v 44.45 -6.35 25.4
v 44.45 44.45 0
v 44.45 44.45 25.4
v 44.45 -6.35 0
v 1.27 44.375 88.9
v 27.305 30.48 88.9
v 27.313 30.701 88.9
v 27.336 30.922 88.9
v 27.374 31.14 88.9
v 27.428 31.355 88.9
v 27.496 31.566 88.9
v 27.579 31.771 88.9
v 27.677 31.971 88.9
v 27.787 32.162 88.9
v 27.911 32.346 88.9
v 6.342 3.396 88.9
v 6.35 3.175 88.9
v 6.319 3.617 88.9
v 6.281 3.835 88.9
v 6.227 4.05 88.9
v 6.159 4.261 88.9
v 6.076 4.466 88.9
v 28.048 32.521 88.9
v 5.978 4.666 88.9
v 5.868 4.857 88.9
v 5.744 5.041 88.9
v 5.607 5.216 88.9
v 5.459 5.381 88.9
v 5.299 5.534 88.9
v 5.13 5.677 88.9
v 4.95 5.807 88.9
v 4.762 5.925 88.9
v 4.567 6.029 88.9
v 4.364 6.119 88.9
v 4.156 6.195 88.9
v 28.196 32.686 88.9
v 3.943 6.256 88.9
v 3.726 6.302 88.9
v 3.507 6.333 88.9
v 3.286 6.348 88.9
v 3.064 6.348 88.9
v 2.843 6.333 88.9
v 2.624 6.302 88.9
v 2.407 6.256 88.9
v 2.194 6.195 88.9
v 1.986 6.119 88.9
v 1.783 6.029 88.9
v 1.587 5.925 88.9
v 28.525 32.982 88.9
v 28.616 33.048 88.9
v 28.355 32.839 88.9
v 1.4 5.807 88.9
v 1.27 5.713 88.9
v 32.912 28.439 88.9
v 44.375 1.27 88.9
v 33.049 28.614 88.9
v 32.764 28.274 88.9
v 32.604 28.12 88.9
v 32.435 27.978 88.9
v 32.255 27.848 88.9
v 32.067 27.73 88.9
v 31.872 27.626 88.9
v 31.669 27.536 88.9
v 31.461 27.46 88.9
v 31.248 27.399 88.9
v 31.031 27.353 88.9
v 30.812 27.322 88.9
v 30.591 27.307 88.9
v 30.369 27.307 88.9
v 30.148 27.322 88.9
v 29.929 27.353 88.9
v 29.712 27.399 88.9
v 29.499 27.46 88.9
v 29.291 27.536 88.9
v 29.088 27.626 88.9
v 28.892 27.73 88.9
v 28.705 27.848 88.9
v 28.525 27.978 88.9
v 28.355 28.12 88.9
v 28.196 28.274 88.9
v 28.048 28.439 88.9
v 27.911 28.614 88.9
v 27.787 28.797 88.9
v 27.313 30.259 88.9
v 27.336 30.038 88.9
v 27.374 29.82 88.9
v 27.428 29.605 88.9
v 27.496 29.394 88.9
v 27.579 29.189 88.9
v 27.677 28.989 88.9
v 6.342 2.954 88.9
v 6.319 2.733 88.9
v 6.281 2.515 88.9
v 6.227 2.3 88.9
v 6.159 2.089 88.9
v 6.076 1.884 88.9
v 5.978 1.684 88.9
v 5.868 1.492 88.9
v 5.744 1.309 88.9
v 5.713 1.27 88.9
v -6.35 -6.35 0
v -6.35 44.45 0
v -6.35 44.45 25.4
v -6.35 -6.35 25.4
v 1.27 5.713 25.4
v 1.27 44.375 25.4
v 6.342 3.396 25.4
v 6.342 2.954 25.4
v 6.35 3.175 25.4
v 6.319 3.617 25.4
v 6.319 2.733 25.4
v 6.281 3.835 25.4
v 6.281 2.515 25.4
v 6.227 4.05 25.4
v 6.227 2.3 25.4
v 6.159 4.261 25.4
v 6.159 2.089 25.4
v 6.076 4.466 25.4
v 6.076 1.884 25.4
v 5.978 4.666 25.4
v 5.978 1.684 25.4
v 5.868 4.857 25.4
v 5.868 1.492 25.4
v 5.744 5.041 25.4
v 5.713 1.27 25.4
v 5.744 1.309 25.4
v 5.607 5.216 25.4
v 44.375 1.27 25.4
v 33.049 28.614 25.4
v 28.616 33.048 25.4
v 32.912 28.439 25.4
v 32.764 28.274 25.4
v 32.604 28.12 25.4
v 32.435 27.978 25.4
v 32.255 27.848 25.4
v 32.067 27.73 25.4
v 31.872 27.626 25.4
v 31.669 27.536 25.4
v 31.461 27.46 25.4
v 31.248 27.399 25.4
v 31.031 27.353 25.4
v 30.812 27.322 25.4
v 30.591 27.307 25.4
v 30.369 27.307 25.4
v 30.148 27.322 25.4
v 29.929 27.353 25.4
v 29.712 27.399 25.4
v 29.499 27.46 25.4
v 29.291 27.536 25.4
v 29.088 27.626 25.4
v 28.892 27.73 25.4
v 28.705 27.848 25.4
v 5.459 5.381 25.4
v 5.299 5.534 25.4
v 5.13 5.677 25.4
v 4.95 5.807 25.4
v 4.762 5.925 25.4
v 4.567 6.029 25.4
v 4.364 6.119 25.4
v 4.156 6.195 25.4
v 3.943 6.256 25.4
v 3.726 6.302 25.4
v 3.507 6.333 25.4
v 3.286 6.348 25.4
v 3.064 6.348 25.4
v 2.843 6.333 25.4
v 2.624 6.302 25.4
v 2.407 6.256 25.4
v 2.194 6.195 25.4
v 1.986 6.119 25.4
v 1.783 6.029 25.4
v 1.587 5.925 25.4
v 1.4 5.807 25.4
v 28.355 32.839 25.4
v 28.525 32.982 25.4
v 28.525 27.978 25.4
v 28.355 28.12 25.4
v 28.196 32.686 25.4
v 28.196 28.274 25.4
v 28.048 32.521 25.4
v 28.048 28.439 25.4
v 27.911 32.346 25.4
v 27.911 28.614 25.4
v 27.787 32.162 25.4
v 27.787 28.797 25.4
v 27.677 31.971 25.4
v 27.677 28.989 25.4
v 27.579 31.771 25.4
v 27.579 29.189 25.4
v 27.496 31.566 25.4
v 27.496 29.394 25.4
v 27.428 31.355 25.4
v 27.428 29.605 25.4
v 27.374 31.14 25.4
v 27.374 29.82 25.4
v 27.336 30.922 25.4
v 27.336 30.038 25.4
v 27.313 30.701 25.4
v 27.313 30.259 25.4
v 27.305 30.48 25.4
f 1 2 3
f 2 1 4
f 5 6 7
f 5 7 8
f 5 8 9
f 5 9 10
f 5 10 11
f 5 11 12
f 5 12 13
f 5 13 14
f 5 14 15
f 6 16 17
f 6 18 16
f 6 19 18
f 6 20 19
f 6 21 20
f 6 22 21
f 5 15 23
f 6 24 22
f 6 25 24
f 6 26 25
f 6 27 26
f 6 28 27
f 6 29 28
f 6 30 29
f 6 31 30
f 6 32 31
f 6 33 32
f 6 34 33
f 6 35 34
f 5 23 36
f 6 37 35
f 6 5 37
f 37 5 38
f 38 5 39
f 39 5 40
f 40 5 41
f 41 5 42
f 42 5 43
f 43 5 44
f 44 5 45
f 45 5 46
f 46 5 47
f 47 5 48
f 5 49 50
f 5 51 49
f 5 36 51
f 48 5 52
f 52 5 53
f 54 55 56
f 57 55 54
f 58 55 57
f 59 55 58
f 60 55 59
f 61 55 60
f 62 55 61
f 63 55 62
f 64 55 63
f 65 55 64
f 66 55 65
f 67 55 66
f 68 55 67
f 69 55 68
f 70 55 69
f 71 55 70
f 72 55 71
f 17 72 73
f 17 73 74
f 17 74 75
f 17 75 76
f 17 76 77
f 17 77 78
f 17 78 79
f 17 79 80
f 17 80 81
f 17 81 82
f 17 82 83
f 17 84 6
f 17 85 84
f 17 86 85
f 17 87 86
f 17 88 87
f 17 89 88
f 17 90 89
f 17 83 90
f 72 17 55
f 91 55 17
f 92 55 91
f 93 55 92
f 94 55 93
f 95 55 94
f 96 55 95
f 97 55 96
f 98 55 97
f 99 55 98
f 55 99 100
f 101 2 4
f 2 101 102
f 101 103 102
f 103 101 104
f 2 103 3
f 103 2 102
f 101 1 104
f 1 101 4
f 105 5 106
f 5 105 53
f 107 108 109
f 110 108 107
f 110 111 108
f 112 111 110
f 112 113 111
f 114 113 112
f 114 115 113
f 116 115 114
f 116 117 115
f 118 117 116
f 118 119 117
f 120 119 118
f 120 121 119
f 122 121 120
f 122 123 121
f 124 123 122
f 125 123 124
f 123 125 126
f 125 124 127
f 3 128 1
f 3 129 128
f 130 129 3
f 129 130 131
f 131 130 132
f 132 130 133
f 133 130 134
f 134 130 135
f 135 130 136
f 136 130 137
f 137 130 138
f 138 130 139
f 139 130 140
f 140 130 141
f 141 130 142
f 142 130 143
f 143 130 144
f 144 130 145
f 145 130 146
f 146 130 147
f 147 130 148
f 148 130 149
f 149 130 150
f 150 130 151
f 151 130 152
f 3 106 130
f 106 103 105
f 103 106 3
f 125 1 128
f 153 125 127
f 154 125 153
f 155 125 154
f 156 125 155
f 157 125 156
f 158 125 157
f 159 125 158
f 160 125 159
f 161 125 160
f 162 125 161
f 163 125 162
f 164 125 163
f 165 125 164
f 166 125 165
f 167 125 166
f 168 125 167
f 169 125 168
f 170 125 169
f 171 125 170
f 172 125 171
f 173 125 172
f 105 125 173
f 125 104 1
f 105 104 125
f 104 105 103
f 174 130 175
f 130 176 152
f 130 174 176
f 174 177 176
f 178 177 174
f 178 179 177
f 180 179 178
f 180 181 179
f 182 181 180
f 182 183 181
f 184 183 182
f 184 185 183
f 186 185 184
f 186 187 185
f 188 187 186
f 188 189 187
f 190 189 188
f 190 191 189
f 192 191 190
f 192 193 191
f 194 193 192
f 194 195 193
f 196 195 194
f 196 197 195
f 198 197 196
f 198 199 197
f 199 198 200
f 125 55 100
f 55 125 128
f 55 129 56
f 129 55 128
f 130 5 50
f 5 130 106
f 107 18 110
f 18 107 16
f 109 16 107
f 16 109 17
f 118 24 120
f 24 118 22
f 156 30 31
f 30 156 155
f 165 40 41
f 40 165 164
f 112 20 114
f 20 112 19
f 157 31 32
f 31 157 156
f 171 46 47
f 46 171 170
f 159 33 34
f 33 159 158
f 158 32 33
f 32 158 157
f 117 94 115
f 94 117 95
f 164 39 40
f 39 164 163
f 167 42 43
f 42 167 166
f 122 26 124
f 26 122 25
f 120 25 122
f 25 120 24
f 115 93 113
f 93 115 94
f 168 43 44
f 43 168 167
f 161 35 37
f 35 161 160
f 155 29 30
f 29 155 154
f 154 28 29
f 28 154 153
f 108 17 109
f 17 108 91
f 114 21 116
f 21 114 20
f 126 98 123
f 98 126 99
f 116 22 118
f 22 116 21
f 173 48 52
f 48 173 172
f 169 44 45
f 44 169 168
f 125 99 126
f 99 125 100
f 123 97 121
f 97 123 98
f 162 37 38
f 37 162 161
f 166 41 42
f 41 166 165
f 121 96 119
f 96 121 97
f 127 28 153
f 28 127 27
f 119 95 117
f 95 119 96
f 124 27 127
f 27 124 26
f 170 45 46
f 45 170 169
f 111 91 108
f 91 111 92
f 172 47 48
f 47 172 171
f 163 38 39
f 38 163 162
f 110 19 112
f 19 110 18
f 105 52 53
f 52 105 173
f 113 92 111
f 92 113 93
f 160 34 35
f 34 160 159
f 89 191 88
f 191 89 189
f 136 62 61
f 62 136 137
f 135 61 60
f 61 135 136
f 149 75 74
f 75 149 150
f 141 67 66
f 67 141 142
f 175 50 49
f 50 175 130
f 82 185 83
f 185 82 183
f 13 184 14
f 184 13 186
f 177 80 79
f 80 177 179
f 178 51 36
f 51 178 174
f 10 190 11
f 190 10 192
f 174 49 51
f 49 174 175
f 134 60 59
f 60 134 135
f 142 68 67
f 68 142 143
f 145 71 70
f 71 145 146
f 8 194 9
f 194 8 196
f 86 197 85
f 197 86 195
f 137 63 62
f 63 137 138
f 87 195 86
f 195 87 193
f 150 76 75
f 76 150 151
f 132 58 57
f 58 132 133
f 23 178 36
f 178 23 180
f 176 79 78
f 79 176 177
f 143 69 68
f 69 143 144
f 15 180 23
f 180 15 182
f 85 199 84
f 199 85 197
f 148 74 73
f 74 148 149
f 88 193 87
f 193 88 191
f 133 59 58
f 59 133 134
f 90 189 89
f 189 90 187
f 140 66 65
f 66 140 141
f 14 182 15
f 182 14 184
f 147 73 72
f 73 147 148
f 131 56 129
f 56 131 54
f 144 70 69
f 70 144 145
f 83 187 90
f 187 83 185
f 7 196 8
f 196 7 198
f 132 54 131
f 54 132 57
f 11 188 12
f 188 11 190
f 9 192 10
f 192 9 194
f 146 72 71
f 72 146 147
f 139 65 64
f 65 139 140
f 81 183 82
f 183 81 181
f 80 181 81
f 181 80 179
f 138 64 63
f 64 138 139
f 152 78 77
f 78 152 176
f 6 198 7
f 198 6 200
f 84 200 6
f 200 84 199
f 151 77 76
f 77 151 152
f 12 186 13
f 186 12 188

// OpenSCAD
module cutter45() {
	translate([0,0,1]) 
		rotate([0,0,-22.5]) 
			translate([-1,0,0])
				cube([4,2,3]);
	translate([0,0,1]) 
		rotate([0,0,22.5]) 
			translate([-3,0,0]) 
				cube([4,2,3]);

}

module block() {
	difference() {
		#cube([2,2,3.5]);
		//translate([0,0,-0.25]) rotate([0,0,0]) #cube([1,3,3]);
		translate([-0.7,-0.5,1]) cube([1,3,3]);
		translate([-0.5,-0.7,1]) cube([3,1,3]);
	}
}

module template() {
	ofst=1.25;
	difference() {
		translate([-0.25,-0.25,0])
			block();

		translate([ofst,ofst,0]) rotate([0,0,-45]) cutter45();
		translate([0.125,0.125,1]) cylinder(d=0.25, h=4, $fn=90);
		translate([1.2,1.2,1]) cylinder(d=0.25, h=4, $fn=90);
	}
}

scale(25.4)
//difference() {
	template();
//	translate([0.1,0.1,-0.1]) scale([0.85,0.85,0.85]) template();
	//rotate([0,0,45]) #cube([6,6,6]);
//}
